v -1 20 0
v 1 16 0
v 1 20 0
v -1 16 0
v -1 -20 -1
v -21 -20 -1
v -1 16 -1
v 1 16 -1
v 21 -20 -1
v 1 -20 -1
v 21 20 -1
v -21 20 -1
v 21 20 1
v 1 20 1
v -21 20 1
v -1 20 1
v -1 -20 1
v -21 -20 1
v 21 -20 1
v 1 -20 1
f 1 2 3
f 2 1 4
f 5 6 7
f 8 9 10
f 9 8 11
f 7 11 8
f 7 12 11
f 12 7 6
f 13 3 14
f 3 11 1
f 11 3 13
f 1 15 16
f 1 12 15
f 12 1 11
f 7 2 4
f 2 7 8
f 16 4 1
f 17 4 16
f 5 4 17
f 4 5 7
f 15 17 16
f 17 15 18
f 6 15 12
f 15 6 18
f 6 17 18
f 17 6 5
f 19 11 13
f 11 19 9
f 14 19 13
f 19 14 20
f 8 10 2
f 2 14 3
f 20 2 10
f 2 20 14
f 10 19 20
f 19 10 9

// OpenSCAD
// A pair of bunny teeth.

translate([0, 18, -0.5])cube([20, 4, 1], center=true);
translate([-11, 0, 0]) cube([20, 40, 2], center=true);
translate([11, 0, 0]) cube([20, 40, 2], center=true);
